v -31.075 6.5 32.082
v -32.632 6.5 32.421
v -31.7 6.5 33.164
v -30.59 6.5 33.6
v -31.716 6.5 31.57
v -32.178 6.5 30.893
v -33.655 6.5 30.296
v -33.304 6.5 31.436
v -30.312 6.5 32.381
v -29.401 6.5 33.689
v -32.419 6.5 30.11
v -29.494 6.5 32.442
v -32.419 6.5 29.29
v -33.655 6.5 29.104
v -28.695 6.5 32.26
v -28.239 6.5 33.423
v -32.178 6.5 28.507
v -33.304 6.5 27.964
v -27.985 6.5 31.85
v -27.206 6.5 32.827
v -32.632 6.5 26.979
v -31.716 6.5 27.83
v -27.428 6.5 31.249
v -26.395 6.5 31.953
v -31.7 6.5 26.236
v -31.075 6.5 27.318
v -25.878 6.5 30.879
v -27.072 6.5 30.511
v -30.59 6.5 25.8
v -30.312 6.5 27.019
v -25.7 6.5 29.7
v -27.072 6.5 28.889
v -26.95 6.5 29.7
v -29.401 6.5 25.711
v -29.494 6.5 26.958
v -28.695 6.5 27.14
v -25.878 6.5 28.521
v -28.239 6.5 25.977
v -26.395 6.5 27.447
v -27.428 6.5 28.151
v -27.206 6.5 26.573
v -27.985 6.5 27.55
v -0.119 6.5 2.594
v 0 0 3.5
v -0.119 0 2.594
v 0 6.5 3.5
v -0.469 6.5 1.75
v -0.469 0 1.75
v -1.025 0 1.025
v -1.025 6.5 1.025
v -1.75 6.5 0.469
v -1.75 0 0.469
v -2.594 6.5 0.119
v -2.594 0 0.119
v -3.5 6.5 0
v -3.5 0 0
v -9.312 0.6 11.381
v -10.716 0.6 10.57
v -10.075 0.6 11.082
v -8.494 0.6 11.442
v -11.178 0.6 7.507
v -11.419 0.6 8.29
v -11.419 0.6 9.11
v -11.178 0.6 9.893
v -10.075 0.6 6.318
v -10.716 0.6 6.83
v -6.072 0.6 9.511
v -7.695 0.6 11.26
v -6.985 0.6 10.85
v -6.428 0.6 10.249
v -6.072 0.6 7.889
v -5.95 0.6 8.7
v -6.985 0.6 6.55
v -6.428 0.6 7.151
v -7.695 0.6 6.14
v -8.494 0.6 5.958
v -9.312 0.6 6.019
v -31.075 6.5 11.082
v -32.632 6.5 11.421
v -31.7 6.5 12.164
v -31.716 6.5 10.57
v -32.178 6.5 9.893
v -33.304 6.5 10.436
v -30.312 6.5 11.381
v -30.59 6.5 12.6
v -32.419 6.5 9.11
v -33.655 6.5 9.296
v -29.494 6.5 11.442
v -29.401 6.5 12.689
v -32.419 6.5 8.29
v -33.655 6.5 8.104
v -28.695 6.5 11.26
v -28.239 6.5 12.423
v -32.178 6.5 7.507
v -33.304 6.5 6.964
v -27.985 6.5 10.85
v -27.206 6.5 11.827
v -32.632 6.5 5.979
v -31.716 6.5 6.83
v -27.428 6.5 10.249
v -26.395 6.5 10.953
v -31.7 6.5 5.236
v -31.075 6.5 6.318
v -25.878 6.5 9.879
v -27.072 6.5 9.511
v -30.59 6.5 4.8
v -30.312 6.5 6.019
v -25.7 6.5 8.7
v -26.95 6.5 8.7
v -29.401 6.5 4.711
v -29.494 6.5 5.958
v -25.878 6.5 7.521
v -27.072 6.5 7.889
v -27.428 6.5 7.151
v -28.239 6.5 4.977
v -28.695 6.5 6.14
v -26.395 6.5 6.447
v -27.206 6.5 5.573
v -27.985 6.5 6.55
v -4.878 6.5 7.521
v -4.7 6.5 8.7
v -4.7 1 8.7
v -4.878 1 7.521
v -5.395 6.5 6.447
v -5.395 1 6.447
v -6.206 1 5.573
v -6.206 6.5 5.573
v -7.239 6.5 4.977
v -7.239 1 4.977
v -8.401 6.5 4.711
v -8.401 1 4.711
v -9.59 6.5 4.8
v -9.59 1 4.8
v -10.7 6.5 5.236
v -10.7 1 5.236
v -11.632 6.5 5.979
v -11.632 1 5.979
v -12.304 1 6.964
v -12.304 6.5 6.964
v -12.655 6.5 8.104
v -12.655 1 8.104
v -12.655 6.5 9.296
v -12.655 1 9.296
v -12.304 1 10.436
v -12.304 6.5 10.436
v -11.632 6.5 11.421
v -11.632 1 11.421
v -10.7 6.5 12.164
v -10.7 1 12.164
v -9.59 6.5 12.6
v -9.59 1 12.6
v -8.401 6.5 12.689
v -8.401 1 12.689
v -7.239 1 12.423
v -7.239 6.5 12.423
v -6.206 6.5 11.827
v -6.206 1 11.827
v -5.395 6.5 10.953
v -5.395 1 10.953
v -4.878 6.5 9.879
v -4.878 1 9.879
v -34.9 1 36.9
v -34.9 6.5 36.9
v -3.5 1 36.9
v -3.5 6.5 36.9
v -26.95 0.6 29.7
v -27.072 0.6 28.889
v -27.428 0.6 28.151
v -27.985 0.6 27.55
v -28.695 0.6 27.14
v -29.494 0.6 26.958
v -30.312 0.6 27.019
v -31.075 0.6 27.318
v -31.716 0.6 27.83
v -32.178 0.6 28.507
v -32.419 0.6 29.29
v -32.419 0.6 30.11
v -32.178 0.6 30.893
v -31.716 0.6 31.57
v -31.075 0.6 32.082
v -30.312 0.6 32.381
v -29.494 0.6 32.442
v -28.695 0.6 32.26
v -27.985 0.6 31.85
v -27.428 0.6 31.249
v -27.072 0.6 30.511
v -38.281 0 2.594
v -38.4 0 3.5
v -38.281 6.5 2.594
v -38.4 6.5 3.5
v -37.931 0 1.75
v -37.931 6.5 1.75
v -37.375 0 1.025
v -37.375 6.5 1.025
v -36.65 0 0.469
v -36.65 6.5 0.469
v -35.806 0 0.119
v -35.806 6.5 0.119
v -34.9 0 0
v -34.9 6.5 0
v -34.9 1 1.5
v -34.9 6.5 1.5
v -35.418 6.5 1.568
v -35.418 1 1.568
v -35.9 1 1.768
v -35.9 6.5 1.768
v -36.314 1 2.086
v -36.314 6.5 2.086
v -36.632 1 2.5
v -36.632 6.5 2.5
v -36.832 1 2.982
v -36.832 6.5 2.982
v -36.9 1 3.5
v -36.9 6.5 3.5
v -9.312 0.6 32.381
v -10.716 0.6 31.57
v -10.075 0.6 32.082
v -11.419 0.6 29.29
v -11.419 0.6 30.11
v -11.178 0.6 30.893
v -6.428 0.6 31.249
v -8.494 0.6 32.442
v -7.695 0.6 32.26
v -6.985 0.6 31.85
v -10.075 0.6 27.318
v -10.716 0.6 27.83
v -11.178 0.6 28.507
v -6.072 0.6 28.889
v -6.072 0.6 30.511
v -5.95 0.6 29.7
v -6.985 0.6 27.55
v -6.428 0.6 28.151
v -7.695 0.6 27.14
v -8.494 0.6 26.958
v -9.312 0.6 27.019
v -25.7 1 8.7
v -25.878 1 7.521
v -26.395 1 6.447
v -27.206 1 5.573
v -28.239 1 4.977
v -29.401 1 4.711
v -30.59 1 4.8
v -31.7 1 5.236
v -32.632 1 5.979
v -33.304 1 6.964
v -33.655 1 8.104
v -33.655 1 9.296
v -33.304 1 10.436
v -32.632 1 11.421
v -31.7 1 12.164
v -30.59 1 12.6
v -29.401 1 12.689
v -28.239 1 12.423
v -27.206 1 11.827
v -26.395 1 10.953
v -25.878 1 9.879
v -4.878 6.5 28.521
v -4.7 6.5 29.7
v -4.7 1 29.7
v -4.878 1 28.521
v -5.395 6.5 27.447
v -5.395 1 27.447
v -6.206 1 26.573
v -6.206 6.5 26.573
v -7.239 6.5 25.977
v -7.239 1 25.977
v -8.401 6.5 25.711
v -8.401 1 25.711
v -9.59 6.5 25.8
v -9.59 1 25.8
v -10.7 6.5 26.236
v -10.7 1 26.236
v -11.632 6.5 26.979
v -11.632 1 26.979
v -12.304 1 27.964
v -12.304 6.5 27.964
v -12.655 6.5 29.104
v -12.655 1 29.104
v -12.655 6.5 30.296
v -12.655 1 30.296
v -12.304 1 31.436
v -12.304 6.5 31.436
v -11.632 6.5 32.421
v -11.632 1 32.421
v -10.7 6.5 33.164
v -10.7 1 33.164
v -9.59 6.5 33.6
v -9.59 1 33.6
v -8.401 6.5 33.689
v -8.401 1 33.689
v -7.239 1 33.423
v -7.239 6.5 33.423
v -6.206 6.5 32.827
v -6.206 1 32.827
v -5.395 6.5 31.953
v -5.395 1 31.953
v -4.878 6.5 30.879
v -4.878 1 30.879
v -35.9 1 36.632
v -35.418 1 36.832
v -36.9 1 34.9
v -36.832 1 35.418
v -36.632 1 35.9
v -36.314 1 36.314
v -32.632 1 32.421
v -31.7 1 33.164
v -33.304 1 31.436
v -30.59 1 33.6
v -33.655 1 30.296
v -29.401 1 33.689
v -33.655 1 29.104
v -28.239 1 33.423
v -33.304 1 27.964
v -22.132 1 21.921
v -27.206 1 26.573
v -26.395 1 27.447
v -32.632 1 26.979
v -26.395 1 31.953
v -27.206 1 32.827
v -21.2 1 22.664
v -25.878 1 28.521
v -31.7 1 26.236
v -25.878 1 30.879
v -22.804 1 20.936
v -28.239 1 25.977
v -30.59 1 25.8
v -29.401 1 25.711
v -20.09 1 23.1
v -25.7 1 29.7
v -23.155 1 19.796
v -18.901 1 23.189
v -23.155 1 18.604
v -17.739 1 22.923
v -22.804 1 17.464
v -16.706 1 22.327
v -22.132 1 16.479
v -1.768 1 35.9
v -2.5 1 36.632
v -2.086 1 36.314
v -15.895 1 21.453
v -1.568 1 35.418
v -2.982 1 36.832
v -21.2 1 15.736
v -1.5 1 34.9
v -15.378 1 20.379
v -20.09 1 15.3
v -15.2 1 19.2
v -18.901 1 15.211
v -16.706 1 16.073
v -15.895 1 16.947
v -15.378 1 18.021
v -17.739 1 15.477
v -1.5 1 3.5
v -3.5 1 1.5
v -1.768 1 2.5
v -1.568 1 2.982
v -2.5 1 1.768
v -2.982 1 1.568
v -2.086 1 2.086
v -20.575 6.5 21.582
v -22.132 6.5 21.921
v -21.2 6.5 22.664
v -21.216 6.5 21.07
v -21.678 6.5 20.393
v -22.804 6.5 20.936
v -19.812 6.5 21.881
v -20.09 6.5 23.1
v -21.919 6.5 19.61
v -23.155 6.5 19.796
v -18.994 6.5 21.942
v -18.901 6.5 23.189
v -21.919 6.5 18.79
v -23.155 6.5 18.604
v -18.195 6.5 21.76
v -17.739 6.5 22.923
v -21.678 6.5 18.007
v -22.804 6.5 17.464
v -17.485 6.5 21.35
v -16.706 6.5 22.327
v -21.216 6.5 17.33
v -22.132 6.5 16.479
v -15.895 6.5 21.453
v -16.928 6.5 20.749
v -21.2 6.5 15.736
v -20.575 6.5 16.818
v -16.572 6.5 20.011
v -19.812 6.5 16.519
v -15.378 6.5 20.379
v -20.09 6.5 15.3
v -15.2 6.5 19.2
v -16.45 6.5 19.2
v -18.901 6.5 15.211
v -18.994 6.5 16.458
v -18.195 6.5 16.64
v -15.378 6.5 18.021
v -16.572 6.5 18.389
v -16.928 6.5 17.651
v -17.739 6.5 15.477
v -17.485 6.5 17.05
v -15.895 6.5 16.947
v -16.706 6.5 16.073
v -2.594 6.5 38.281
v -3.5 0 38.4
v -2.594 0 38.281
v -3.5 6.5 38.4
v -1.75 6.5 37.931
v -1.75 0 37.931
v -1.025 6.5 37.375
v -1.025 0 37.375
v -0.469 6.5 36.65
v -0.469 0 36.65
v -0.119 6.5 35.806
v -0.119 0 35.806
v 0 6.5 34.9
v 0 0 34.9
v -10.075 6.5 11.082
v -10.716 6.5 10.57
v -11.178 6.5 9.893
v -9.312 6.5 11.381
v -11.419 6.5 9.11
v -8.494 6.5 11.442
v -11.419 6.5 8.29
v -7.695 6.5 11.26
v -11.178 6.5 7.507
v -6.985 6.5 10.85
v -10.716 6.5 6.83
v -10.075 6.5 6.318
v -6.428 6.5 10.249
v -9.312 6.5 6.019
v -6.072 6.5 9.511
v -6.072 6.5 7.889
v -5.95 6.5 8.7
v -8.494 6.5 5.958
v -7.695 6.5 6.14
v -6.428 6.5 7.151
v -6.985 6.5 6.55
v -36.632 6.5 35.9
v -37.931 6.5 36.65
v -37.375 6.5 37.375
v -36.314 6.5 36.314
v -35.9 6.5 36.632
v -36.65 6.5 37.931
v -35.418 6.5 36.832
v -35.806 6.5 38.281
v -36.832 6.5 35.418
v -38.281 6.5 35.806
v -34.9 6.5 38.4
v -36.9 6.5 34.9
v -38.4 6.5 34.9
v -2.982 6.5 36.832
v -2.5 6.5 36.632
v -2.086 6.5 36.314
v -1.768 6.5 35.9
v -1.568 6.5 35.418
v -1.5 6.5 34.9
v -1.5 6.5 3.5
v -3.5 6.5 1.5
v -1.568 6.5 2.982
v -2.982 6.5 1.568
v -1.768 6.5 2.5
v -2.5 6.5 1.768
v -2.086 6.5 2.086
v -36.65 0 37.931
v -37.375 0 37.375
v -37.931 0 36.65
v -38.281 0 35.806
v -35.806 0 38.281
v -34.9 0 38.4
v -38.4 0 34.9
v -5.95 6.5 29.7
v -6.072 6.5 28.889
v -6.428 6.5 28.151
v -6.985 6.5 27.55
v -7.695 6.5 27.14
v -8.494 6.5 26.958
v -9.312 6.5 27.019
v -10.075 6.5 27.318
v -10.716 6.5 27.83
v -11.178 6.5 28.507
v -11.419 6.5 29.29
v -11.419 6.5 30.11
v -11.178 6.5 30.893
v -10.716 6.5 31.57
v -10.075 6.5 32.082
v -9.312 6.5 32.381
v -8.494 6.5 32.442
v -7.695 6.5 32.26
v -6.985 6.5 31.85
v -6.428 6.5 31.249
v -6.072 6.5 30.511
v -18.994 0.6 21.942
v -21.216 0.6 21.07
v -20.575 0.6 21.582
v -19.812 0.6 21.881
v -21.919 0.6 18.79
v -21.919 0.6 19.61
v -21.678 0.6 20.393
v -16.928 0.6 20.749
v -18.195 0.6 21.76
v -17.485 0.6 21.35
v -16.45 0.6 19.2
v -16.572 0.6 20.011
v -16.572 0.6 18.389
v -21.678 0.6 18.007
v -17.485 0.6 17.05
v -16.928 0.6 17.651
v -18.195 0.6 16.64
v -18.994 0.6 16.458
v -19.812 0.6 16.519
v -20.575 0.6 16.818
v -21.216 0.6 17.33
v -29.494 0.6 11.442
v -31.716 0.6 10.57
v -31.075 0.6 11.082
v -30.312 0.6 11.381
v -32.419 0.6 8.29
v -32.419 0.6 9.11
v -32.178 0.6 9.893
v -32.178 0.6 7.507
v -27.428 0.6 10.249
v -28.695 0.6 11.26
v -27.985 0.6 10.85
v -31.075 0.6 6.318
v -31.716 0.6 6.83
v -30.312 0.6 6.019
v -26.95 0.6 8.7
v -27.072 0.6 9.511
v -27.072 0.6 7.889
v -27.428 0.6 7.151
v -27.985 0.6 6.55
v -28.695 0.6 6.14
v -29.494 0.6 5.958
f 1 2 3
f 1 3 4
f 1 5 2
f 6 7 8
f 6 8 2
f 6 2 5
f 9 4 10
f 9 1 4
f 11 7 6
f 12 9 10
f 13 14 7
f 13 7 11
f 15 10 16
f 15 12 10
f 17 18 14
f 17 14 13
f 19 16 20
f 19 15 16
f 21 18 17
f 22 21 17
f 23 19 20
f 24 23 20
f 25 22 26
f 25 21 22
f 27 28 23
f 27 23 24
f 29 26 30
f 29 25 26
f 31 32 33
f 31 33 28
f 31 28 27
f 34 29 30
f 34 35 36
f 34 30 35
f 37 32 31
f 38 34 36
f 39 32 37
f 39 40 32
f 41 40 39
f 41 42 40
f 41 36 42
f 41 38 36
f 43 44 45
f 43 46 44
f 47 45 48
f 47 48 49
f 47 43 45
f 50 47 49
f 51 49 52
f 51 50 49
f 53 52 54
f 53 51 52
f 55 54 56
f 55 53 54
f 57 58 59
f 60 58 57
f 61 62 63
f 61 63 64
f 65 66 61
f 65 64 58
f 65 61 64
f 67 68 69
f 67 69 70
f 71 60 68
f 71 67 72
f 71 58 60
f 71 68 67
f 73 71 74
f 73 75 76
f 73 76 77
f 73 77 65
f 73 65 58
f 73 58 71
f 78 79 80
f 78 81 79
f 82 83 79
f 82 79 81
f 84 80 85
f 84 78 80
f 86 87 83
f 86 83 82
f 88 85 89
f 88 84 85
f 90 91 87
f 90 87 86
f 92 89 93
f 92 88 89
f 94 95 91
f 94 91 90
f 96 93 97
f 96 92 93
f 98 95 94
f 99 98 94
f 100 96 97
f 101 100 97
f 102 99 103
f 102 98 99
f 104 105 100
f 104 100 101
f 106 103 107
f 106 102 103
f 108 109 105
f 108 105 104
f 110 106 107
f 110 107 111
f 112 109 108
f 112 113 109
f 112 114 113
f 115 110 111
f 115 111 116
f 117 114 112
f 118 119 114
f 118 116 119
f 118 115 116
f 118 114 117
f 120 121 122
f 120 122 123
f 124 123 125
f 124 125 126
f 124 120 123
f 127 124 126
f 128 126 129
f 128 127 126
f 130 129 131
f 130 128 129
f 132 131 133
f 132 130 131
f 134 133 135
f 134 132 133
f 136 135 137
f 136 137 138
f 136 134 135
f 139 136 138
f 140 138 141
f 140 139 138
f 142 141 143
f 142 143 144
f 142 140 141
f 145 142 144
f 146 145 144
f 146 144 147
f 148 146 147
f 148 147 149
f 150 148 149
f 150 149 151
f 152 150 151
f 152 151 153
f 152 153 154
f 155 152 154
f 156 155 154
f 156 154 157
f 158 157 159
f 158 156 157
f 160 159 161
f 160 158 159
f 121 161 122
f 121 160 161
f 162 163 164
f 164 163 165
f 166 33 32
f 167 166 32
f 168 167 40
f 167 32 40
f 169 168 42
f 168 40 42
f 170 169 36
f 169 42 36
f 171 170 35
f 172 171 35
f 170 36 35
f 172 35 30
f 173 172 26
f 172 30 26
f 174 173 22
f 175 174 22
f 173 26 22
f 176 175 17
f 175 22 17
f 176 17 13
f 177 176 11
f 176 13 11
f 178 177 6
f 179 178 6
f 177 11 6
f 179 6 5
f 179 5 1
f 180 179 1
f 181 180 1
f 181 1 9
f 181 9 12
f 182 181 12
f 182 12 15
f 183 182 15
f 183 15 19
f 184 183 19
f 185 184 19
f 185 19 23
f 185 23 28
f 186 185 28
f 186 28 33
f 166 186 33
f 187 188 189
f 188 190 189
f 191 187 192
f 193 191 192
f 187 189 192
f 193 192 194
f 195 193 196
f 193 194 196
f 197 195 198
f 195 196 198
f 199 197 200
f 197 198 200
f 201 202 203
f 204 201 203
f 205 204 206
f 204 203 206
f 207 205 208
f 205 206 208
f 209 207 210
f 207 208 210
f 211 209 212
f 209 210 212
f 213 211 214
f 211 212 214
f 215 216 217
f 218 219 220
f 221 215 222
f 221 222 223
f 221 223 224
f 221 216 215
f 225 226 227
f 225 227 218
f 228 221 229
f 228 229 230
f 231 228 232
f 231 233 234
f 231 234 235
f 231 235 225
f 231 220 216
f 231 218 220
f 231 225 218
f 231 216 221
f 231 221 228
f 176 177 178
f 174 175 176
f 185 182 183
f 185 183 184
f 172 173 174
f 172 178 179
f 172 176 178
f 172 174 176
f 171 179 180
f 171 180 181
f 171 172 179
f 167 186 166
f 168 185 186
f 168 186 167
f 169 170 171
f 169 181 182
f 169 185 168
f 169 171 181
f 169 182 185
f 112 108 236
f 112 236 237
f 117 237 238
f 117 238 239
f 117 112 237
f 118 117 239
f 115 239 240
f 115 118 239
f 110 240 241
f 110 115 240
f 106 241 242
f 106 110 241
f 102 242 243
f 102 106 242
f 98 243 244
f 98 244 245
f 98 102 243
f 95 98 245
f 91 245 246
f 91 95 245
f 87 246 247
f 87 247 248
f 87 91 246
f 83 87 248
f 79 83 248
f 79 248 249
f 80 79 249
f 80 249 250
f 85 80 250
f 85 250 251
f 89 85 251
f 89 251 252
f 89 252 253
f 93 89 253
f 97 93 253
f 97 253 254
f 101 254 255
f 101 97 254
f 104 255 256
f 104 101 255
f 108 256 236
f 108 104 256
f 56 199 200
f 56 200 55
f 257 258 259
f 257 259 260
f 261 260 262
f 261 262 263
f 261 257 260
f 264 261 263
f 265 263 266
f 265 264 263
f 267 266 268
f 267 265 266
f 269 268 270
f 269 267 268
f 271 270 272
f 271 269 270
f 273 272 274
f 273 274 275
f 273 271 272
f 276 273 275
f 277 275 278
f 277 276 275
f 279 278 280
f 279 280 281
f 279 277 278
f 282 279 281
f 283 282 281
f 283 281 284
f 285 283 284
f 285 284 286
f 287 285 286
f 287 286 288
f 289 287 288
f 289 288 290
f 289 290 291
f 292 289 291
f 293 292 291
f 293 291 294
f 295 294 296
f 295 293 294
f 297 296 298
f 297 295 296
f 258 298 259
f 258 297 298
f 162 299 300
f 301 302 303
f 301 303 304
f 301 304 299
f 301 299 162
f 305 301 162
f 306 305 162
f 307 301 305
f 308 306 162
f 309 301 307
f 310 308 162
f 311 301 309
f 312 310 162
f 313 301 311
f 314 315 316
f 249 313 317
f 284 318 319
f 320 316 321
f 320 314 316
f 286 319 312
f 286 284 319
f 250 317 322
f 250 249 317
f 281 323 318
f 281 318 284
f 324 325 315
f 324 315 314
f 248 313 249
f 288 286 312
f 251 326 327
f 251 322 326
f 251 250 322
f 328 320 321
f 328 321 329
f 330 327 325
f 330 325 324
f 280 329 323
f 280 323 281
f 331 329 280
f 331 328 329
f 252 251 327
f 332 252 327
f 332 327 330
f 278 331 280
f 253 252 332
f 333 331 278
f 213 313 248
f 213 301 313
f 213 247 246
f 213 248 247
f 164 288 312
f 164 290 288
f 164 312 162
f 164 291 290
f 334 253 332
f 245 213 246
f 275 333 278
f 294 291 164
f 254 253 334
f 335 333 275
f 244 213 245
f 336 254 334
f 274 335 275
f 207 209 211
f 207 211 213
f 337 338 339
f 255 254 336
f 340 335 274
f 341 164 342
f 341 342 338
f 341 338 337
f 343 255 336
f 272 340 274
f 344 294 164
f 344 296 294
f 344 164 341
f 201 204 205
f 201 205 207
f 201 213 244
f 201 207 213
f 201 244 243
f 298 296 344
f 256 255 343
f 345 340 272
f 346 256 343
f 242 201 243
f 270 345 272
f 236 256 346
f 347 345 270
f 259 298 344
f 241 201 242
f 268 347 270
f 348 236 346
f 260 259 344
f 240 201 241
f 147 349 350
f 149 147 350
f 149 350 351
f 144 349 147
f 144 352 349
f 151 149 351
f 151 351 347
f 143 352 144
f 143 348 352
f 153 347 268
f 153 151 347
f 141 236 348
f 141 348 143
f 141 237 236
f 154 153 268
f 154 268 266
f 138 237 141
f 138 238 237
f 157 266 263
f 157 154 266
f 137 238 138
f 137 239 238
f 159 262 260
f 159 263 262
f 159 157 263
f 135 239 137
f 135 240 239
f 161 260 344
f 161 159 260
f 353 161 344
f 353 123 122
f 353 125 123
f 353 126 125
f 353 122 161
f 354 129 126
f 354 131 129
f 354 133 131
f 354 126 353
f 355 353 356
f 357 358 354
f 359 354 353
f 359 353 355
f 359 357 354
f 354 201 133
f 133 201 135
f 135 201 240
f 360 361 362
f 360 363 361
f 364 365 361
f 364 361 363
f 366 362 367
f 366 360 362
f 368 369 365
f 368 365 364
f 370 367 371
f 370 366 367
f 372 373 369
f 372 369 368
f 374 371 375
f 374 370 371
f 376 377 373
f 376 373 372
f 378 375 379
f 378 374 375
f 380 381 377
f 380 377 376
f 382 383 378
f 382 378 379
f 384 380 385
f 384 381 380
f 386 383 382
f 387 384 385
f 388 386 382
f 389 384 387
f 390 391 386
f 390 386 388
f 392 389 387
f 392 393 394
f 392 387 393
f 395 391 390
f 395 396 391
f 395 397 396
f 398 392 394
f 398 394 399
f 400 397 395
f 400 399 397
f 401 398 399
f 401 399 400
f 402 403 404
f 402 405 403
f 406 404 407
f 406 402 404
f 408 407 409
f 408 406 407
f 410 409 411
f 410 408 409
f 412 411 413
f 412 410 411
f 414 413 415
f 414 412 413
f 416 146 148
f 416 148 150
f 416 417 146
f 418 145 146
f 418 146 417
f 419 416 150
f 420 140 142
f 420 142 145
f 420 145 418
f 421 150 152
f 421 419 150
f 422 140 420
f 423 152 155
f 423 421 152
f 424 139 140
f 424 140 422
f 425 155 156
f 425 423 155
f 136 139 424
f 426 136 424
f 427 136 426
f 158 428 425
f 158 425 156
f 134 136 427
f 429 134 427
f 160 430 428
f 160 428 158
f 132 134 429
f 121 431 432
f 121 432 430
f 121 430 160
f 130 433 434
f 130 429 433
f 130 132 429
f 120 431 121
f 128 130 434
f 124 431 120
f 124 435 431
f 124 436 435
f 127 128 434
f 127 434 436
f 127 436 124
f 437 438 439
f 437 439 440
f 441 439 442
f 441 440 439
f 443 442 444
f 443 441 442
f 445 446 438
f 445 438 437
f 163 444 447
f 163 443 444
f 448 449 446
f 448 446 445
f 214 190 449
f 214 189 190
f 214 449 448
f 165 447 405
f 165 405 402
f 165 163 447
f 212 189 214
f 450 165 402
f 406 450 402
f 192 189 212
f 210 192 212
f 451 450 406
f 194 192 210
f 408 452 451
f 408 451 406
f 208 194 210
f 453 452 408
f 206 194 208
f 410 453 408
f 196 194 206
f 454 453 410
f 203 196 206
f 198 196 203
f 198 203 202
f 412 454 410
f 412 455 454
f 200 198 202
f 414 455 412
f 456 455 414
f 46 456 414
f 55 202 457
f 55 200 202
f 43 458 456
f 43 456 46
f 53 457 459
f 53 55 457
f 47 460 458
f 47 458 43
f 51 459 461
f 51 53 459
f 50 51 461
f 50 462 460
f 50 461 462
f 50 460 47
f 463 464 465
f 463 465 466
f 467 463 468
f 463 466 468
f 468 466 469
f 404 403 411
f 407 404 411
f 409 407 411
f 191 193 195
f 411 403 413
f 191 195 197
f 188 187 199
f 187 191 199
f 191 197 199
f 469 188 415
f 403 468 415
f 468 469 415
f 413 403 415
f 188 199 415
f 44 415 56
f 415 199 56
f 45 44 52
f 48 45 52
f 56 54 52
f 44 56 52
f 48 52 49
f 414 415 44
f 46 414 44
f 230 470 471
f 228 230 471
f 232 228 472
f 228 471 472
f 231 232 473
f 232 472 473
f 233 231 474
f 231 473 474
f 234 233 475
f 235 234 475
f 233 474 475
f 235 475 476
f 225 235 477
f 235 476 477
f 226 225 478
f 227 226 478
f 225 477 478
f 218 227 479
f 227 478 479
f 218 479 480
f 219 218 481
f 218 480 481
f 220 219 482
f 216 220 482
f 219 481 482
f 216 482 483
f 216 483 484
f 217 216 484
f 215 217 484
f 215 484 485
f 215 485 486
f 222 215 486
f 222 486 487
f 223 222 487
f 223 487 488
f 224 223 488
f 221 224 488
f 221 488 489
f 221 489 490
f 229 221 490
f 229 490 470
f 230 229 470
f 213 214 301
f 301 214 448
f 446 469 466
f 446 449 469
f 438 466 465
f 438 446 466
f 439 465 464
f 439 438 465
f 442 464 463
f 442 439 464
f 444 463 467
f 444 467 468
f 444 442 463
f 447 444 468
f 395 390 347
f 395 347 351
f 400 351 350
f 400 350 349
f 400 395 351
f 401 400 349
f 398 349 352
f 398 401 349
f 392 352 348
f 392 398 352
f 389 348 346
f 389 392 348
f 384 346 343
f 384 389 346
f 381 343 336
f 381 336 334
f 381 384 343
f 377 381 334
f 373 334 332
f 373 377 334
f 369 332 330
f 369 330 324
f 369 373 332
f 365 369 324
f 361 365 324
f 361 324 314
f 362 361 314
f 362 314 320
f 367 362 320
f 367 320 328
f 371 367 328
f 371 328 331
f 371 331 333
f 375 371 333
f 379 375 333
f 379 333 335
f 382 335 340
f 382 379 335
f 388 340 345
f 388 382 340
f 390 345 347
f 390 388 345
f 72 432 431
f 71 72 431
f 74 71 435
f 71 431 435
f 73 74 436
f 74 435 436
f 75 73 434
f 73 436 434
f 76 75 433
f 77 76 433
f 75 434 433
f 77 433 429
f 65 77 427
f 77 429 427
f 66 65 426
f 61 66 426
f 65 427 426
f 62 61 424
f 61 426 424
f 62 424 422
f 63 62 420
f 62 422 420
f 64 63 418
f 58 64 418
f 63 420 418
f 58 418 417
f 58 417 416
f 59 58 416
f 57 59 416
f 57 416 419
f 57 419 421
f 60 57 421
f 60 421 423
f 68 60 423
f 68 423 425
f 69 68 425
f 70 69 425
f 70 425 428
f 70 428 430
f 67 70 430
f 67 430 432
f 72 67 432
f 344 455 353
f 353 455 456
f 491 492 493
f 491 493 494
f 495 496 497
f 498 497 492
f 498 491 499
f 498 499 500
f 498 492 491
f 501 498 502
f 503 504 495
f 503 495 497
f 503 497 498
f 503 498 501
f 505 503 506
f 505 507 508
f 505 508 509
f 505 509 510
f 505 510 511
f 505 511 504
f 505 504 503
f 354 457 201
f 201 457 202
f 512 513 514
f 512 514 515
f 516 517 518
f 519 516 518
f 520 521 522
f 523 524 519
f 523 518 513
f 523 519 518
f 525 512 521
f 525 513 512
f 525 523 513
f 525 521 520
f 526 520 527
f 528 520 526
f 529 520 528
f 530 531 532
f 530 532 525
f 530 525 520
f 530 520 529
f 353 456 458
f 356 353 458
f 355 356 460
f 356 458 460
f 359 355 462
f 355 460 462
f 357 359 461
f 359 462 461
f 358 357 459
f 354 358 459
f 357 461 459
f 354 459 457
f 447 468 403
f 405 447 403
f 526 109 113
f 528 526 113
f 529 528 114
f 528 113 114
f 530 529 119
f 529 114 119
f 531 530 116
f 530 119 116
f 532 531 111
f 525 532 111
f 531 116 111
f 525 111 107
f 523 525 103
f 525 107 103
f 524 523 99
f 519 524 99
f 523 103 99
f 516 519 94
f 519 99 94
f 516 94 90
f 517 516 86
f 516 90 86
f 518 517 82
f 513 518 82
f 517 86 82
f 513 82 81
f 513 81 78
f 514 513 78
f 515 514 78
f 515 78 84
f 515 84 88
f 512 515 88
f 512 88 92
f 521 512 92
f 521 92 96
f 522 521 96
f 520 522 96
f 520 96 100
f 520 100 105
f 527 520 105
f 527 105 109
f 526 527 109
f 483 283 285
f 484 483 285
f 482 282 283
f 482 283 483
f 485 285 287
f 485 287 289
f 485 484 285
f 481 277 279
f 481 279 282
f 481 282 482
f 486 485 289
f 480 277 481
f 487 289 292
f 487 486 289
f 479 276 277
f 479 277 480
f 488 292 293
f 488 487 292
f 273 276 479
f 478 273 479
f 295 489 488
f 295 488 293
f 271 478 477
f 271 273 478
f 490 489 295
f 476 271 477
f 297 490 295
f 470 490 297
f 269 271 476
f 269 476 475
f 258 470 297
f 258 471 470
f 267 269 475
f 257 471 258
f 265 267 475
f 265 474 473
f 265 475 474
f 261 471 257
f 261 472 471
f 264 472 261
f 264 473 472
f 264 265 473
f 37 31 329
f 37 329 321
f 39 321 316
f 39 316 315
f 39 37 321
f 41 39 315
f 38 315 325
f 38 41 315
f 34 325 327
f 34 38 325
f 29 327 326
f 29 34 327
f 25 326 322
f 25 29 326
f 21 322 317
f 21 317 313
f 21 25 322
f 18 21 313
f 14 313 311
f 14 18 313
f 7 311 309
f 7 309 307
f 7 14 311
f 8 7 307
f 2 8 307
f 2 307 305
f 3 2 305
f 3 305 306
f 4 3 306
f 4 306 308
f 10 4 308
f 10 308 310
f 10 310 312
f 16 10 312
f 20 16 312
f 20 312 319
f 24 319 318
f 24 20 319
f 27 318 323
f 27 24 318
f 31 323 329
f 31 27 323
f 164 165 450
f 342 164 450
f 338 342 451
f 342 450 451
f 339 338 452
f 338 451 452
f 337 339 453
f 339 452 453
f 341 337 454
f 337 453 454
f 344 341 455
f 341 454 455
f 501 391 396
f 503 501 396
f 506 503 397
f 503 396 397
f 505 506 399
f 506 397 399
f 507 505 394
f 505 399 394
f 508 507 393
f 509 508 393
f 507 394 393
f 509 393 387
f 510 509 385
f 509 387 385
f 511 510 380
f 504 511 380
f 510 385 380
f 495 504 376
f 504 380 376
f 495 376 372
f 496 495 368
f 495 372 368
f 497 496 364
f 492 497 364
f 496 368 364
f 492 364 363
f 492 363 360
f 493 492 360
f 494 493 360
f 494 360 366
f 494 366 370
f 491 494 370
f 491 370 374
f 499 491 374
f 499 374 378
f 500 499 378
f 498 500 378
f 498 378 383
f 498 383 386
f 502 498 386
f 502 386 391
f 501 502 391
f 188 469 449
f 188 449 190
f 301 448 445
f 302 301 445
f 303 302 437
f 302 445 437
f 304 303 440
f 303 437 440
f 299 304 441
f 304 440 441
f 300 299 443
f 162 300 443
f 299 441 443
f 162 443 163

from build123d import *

# Parameters (mm, degrees)
SKETCH1_W           = 38.4
SKETCH1_H           = 38.4
BOSS_EXTRUDE1_DEPTH = 6.5
FILLET1_R           = 3.5
SKETCH7_R           = 4
SKETCH7_R_2         = 2.75
CUT_EXTRUDE1_DEPTH  = 5.5
SKETCH8_R           = 2.75
CUT_EXTRUDE2_DEPTH  = 0.4


with BuildPart() as part:
    # Sketch1 → Boss-Extrude1 (new body)
    with BuildSketch(Plane(origin=(0, 0, 0), x_dir=(1, 0, 0), z_dir=(0, 1, 0))):
        with Locations((-19.2, -19.2)):
            Rectangle(SKETCH1_W, SKETCH1_H)
    extrude(amount=BOSS_EXTRUDE1_DEPTH)

    # Fillet1
    fillet1_edges = [part.edges().sort_by_distance(p)[0] for p in [
        (0, 3.25, 38.4),
        (-38.4, 3.25, 38.4),
        (-38.4, 3.25, 0),
        (0, 3.25, 0),
    ]]
    fillet(fillet1_edges, radius=FILLET1_R)

    # Sketch7 → Cut-Extrude1 (cut)
    with BuildSketch(Plane(origin=(0, 6.5, 0), x_dir=(1, 0, 0), z_dir=(0, 1, 0))):
        with BuildLine():
            Line((-3.5, -1.5), (-34.9, -1.5))
            ThreePointArc((-34.9, -1.5), (-36.314213562, -2.085786438), (-36.9, -3.5))
            Line((-36.9, -3.5), (-36.9, -34.9))
            ThreePointArc((-36.9, -34.9), (-36.314213562, -36.314213562), (-34.9, -36.9))
            Line((-34.9, -36.9), (-3.5, -36.9))
            ThreePointArc((-3.5, -36.9), (-2.085786438, -36.314213562), (-1.5, -34.9))
            Line((-1.5, -34.9), (-1.5, -3.5))
            ThreePointArc((-1.5, -3.5), (-2.085786438, -2.085786438), (-3.5, -1.5))
        make_face()
        with Locations((-19.2, -19.2)):
            Circle(SKETCH7_R, mode=Mode.SUBTRACT)
        with Locations((-29.7, -29.7)):
            Circle(SKETCH7_R, mode=Mode.SUBTRACT)
        with Locations((-8.7, -29.7)):
            Circle(SKETCH7_R, mode=Mode.SUBTRACT)
        with Locations((-8.7, -8.7)):
            Circle(SKETCH7_R, mode=Mode.SUBTRACT)
        with Locations((-29.7, -8.7)):
            Circle(SKETCH7_R, mode=Mode.SUBTRACT)
        with Locations((-29.7, -8.7)):
            Circle(SKETCH7_R_2)
        with Locations((-8.7, -8.7)):
            Circle(SKETCH7_R_2)
        with Locations((-19.2, -19.2)):
            Circle(SKETCH7_R_2)
        with Locations((-29.7, -29.7)):
            Circle(SKETCH7_R_2)
        with Locations((-8.7, -29.7)):
            Circle(SKETCH7_R_2)
    extrude(amount=-CUT_EXTRUDE1_DEPTH, mode=Mode.SUBTRACT)

    # Sketch8 → Cut-Extrude2 (cut)
    with BuildSketch(Plane(origin=(0, 1, 0), x_dir=(1, 0, 0), z_dir=(0, 1, 0))):
        with Locations((-29.7, -29.7)):
            Circle(SKETCH8_R)
        with Locations((-8.7, -29.7)):
            Circle(SKETCH8_R)
        with Locations((-8.7, -8.7)):
            Circle(SKETCH8_R)
        with Locations((-19.2, -19.2)):
            Circle(SKETCH8_R)
        with Locations((-29.7, -8.7)):
            Circle(SKETCH8_R)
    extrude(amount=-CUT_EXTRUDE2_DEPTH, mode=Mode.SUBTRACT)


solid = part.part
